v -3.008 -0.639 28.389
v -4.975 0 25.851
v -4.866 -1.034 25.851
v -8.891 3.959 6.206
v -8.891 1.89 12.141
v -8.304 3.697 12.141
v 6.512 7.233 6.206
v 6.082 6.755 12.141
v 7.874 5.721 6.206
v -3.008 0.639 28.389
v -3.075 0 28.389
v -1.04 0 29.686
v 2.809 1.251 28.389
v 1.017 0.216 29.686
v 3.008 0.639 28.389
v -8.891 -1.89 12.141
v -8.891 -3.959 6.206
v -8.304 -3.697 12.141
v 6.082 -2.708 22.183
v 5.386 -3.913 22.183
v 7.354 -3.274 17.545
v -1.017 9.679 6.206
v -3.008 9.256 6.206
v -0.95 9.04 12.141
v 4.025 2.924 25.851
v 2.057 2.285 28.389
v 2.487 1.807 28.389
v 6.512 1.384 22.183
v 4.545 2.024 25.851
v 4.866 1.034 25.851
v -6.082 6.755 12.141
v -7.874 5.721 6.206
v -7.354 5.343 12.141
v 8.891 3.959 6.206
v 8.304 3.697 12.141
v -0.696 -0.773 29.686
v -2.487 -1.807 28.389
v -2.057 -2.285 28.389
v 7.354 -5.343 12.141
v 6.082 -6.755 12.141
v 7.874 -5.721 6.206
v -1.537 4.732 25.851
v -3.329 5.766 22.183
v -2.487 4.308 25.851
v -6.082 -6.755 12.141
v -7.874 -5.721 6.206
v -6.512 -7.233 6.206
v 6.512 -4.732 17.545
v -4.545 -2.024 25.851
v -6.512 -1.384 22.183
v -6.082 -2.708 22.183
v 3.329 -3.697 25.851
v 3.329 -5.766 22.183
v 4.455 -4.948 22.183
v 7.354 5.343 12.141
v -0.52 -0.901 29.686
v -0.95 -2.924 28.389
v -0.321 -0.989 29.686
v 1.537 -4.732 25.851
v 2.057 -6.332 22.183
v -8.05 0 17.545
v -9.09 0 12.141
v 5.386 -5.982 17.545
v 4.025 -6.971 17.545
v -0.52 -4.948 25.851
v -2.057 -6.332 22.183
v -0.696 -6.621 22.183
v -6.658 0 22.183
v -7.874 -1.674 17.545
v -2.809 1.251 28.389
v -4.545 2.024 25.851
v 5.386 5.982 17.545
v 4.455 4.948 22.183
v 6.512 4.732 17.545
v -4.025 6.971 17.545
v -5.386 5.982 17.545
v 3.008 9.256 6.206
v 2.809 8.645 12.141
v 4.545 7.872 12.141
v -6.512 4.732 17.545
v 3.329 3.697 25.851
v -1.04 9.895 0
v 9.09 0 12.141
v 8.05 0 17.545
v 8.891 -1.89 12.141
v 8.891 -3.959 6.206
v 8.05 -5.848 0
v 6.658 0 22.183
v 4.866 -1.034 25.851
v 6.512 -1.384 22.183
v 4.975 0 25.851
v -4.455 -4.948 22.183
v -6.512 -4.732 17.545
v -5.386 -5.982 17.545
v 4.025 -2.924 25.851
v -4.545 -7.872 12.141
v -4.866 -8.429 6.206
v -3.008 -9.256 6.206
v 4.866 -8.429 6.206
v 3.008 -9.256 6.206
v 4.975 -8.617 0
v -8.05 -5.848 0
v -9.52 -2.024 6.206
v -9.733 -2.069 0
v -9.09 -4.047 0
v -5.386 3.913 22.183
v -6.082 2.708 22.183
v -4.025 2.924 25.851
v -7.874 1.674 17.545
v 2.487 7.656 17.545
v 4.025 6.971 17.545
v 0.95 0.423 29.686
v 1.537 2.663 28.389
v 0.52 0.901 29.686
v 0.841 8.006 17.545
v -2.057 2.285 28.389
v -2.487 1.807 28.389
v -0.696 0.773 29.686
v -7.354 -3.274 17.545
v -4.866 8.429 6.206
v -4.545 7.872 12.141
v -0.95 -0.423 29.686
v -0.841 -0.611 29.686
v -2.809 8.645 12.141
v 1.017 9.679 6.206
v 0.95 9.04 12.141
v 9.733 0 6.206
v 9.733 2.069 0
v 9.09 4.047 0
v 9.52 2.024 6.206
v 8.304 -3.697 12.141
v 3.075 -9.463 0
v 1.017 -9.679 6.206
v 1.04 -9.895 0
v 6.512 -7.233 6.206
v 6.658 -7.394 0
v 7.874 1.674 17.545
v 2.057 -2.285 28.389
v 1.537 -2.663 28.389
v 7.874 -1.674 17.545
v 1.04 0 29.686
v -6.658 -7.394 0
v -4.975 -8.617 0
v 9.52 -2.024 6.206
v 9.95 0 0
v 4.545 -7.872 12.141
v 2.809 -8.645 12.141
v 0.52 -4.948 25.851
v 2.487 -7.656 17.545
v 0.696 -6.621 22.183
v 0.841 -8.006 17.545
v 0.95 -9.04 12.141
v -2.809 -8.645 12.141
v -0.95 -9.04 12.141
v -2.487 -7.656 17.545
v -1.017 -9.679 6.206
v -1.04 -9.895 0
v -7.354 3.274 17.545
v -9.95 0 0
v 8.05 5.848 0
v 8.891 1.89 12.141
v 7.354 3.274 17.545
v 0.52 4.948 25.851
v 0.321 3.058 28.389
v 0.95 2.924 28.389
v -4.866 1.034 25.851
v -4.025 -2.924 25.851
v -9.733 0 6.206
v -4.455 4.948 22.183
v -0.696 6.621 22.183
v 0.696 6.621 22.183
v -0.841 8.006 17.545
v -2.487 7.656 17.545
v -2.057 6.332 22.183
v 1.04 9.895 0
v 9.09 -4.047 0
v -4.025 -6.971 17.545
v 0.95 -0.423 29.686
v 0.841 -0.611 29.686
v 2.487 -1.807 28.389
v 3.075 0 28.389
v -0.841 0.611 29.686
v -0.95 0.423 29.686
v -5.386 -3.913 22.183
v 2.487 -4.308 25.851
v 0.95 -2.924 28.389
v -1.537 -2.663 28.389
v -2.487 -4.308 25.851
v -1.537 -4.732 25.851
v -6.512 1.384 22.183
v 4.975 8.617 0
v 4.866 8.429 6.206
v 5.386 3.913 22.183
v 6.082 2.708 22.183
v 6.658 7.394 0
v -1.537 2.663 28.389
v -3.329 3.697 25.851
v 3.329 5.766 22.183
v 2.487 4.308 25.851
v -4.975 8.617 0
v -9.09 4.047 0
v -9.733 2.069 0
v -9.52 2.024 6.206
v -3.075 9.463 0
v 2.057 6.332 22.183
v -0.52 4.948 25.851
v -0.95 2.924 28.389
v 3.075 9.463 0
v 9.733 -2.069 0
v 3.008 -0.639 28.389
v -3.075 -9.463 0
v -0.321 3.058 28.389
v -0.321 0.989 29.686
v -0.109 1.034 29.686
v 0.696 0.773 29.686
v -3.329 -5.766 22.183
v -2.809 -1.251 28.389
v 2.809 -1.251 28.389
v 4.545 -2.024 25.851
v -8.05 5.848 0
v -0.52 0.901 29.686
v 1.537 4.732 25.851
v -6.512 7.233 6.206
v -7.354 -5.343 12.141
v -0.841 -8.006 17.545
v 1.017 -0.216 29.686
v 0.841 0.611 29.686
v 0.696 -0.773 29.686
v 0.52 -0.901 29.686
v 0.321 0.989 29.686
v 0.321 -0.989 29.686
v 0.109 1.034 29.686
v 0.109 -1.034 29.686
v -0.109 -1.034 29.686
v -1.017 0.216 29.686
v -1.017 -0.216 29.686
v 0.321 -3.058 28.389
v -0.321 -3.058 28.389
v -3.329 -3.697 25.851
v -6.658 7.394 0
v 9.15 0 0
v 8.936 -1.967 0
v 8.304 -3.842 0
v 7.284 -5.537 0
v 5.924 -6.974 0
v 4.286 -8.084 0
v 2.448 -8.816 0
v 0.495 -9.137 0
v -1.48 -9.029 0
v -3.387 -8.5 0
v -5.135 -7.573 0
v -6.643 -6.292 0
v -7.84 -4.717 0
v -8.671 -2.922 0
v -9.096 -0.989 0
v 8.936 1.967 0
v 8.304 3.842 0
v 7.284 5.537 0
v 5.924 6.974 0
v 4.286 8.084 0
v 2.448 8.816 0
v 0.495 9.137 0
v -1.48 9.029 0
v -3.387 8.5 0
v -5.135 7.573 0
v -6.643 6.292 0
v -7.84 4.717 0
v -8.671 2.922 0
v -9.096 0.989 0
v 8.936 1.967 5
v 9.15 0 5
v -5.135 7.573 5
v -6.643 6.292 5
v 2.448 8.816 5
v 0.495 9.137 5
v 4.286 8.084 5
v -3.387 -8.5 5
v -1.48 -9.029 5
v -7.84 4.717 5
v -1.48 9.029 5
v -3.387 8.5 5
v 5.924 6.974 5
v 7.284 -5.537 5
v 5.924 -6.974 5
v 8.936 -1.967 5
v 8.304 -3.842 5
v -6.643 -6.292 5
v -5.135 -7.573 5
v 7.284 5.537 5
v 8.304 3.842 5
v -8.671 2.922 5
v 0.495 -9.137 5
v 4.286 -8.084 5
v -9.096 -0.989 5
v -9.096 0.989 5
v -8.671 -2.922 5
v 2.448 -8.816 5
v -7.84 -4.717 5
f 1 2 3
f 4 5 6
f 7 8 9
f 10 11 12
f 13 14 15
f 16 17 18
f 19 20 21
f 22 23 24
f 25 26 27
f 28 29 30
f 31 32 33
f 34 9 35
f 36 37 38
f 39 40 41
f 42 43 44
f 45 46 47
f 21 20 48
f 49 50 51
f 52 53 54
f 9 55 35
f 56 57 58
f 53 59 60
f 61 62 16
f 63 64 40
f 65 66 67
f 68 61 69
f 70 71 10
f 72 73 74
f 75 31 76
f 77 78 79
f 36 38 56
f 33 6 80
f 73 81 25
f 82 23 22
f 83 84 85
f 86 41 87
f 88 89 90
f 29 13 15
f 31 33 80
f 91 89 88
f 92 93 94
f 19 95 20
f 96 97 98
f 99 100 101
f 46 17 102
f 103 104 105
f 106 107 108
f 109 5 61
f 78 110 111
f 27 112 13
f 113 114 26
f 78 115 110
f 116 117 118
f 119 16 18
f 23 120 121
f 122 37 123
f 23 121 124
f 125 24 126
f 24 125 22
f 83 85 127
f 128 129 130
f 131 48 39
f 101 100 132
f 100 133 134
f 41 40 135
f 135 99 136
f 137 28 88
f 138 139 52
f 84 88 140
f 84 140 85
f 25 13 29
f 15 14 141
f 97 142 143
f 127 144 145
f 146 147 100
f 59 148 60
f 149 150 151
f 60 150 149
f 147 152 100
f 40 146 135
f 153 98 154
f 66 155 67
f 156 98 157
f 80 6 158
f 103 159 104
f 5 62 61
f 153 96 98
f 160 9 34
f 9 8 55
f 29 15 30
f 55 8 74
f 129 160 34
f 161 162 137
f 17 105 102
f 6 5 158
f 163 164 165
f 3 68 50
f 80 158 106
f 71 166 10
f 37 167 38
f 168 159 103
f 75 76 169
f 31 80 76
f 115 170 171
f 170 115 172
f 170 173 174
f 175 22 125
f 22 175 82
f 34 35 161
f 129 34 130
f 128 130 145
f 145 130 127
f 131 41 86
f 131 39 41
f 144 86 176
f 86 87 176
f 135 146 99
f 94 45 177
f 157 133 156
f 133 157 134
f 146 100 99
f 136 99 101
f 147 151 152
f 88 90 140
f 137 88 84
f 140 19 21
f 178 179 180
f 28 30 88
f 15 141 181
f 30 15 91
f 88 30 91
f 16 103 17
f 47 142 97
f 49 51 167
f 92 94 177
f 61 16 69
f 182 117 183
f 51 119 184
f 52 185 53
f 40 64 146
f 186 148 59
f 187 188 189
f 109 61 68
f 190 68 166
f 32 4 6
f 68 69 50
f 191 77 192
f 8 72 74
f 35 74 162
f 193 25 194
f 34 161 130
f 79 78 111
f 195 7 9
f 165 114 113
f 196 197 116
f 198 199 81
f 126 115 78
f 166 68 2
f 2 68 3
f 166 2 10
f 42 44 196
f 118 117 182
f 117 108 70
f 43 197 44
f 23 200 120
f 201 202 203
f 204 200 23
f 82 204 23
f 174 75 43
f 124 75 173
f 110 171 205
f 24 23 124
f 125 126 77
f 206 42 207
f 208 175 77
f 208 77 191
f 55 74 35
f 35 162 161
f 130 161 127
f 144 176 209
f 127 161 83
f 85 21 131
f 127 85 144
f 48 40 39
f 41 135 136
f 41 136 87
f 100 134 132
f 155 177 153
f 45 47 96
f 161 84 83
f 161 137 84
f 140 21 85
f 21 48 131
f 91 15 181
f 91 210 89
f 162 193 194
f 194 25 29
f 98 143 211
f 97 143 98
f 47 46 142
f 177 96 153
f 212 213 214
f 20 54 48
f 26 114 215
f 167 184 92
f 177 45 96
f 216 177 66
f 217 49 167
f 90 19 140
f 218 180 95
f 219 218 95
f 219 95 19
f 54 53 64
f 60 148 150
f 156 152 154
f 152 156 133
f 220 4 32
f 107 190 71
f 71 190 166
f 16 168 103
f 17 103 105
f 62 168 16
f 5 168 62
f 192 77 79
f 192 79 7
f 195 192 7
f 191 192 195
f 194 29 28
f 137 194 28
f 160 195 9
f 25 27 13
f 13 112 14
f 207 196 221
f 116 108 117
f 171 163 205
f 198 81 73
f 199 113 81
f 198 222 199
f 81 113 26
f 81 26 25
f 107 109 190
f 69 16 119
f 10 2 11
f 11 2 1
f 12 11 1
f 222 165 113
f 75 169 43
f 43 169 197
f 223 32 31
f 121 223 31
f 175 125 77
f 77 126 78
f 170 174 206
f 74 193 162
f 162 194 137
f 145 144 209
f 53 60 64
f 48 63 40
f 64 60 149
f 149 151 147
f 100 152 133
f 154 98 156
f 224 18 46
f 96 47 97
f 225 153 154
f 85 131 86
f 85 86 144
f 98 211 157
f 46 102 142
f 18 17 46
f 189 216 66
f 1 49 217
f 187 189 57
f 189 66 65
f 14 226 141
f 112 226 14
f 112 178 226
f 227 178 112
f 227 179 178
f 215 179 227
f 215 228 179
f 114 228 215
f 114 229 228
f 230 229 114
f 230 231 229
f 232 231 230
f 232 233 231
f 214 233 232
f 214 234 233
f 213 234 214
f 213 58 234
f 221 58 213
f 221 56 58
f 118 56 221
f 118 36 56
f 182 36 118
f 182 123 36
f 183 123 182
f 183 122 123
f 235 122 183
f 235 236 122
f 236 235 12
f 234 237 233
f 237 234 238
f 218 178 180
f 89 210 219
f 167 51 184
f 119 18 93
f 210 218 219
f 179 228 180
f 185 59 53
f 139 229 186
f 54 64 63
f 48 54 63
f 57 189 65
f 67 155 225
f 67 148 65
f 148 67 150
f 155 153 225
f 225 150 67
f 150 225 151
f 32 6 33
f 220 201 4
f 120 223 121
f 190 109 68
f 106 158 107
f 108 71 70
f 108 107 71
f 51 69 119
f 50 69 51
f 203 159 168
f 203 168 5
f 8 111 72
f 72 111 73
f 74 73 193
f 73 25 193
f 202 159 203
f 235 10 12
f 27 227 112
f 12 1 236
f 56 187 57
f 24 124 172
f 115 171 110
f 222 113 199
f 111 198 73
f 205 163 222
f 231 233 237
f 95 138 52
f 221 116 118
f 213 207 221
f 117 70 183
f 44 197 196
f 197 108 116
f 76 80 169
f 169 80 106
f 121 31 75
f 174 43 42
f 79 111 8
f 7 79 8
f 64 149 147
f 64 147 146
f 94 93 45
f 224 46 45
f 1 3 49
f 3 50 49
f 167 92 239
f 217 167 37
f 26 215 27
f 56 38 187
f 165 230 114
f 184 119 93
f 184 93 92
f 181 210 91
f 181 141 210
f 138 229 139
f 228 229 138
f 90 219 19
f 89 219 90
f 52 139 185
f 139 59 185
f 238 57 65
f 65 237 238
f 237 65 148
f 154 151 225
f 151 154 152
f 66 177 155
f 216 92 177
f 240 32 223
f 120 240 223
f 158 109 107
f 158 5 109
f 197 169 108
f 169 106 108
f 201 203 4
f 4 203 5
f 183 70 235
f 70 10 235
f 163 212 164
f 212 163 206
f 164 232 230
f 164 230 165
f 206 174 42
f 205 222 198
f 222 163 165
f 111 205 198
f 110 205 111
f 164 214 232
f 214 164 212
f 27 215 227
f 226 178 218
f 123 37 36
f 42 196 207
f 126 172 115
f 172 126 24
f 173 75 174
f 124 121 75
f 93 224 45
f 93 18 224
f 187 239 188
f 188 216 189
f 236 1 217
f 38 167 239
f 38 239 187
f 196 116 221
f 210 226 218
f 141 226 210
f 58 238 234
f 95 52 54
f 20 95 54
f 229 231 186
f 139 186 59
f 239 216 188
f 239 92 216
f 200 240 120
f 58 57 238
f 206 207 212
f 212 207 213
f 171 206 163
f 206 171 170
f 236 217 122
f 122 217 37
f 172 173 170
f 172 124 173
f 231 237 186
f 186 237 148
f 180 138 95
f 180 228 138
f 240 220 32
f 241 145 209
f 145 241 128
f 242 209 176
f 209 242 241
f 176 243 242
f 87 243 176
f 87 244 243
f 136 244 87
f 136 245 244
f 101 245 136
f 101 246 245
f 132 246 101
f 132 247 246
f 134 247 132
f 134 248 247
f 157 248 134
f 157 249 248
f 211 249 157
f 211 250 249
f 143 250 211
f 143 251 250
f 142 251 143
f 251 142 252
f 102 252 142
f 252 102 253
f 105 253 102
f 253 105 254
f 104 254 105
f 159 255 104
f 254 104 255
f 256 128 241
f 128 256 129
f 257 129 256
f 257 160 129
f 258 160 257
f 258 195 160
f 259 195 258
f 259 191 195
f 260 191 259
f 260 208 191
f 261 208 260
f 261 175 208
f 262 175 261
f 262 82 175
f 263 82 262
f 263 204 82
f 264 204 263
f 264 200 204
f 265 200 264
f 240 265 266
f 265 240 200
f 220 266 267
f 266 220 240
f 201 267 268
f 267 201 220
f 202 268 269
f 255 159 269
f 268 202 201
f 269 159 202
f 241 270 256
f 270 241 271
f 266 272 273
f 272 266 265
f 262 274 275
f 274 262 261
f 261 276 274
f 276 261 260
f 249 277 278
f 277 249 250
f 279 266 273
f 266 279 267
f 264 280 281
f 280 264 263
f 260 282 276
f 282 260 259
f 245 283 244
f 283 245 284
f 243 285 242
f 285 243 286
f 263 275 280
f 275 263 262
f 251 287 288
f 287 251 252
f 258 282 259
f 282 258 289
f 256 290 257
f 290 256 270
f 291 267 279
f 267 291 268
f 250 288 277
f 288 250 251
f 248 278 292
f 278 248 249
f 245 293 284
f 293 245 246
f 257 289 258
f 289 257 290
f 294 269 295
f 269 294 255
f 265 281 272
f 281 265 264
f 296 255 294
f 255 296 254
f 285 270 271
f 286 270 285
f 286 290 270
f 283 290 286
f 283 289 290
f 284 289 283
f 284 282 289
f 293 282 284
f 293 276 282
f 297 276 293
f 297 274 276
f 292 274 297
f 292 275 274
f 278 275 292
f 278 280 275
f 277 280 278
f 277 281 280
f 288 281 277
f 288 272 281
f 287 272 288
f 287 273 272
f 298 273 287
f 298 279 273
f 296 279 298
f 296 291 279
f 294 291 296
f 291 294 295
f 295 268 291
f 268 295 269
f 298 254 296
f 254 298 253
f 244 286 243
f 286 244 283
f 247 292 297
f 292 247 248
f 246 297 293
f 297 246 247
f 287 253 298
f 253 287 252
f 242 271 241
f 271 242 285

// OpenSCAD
//buri.scad

tol = 0.4;

engine_radius = 17.5 / 2;
engine_height = 70;

nose_assembly_thickness = 1.2;
nose_assembly_slot_height = 5;

module a8_3_engine() {
  cylinder(engine_height, engine_radius + tol, engine_radius + tol);
}

difference() {
  // the nose cone
  difference() {
    scale([1, 1, 3]) {
      sphere(engine_radius + nose_assembly_thickness);
    }
    translate([0, 0, -4 / 2 * engine_radius]) {
      cube(4 * engine_radius * [1, 1, 1], true);
    }
  }

  translate([0, 0, nose_assembly_slot_height]) {
    mirror([0, 0, 1]) {
      // the engine
      // remove the '#' that was in front of the cylinder()
      a8_3_engine()

      // the inner dome
      sphere(engine_radius + tol);
    }
  }
}
